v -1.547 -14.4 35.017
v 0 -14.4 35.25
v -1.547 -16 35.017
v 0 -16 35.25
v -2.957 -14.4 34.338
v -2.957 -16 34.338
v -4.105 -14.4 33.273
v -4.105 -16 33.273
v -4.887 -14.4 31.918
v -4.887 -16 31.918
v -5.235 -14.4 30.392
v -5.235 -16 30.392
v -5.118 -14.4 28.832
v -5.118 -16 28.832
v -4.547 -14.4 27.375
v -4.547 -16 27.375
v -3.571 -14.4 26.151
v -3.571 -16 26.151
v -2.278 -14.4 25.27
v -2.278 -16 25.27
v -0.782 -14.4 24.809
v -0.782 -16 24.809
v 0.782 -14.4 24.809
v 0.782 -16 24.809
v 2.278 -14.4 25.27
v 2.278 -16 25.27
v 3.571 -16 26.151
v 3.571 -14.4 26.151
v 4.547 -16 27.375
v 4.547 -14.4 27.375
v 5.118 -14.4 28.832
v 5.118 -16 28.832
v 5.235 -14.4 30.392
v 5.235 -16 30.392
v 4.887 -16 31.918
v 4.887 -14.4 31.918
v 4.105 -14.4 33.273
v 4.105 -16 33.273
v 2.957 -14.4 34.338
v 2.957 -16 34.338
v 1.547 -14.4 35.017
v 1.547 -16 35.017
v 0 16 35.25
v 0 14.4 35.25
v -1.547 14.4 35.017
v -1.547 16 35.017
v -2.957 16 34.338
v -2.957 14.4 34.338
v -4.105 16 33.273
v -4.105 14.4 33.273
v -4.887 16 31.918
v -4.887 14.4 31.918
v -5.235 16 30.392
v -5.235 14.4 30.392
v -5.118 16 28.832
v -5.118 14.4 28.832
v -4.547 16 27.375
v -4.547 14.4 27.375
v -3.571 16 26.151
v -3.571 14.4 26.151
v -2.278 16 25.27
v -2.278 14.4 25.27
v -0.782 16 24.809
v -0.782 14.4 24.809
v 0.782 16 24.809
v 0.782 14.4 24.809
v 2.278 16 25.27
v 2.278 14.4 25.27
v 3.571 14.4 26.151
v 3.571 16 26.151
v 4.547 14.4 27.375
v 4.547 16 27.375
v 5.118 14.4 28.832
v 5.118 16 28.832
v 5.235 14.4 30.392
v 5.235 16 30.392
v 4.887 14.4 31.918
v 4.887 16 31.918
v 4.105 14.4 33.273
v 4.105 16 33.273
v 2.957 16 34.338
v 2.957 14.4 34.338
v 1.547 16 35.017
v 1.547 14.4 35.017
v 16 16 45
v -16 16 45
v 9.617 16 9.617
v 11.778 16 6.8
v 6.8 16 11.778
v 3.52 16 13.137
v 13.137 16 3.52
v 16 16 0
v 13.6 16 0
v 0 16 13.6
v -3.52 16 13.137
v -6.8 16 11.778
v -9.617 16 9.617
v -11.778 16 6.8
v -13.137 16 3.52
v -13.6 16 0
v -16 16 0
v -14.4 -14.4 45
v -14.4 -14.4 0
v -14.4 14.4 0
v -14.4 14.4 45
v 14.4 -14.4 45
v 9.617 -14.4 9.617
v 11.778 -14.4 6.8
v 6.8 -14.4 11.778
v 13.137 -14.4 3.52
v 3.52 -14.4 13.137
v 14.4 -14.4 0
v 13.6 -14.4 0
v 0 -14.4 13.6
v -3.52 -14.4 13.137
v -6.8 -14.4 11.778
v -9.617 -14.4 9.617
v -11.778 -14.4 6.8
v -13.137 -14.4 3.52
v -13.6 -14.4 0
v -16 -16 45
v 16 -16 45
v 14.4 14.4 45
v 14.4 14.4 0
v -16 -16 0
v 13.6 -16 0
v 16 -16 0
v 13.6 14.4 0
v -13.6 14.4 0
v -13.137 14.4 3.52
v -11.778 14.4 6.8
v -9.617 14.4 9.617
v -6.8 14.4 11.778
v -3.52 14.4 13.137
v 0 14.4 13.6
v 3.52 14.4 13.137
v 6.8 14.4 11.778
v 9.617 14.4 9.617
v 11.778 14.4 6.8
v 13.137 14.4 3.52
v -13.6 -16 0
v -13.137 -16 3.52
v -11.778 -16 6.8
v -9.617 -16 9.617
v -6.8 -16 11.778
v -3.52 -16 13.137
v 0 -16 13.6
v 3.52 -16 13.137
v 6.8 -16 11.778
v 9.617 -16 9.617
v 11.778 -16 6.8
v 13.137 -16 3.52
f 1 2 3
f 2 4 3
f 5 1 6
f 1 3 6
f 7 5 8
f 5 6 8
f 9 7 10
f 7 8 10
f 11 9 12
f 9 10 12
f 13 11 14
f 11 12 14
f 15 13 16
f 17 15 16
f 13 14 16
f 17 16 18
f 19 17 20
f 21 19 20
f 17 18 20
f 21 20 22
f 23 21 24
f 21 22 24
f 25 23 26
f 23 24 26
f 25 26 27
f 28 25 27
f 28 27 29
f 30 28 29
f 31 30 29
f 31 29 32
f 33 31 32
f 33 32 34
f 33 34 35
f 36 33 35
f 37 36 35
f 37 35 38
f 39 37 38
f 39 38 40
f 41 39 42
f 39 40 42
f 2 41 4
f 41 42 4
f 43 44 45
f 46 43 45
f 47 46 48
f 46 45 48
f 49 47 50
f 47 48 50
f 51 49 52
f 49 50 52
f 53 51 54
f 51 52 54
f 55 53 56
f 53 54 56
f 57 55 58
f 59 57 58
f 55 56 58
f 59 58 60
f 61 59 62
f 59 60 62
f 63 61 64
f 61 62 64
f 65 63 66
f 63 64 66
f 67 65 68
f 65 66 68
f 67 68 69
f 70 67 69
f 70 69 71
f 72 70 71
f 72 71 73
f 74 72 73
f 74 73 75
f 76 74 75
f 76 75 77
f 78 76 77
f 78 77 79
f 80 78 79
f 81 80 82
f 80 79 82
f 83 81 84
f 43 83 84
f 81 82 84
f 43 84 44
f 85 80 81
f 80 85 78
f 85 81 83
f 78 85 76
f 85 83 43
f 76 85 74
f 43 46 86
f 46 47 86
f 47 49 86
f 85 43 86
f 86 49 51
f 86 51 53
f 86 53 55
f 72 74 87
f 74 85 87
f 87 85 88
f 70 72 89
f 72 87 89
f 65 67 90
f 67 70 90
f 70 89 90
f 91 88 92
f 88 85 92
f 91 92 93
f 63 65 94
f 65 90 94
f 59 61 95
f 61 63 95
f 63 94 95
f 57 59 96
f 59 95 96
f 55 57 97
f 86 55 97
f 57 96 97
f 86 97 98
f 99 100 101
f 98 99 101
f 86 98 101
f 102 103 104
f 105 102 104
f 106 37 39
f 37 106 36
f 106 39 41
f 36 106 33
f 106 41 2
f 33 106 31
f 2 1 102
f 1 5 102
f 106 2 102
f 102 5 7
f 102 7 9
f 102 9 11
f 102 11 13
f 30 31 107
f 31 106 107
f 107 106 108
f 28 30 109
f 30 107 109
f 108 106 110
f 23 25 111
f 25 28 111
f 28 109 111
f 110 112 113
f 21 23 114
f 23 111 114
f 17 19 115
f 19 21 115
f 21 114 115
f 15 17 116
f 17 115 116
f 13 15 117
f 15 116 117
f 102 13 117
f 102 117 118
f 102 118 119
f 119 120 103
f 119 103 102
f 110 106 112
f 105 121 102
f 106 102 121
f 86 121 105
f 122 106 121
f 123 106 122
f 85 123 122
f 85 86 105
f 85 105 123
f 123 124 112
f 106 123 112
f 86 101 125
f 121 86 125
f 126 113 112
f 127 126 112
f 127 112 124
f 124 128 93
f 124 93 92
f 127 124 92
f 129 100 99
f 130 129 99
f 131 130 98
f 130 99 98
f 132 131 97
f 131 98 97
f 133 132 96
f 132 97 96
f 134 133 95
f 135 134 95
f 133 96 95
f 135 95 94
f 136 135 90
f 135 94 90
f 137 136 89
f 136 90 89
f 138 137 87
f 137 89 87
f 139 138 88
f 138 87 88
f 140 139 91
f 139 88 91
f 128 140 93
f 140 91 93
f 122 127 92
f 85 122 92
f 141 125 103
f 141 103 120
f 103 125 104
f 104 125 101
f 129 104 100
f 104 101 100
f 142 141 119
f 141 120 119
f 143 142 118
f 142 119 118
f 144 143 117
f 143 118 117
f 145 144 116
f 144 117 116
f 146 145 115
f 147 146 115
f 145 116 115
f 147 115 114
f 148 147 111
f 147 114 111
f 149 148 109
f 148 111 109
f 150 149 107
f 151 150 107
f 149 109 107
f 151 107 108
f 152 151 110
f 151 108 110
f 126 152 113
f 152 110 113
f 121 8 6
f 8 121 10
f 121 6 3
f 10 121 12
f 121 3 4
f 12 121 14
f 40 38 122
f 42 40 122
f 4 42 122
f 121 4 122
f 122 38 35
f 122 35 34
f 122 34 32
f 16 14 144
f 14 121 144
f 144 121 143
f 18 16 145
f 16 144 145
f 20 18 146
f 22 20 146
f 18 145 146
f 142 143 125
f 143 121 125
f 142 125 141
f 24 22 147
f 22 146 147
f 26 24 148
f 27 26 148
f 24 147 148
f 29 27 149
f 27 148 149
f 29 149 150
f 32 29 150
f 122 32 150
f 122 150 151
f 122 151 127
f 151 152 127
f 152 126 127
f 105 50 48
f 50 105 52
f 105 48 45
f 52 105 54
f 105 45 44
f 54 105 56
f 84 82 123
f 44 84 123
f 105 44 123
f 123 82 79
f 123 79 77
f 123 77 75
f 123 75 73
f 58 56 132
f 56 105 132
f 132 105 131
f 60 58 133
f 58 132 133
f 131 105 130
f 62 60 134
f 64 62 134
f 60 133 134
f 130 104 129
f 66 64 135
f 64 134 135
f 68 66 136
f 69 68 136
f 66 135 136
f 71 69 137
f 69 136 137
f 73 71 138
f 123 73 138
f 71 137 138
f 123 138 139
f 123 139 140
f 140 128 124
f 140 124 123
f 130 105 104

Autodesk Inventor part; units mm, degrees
ref_plane "YZ Plane" through (0, 0, 0) normal (1, 0, 0) x (0, 1, 0)
ref_plane "XZ Plane" through (0, 0, 0) normal (0, 1, 0) x (-1, 0, 0)
ref_plane "XY Plane" through (0, 0, 0) normal (0, 0, 1) x (1, 0, 0)
sketch "スケッチ1" plane through (0, 0, 0) normal (0, 0, 1) x (1, 0, 0)
  line L0 (-16, -16) -> (16, -16)
  line L1 (16, -16) -> (16, 16)
  line L2 (16, 16) -> (-16, 16)
  line L3 (-16, 16) -> (-16, -16)
  line L4 (-16, -16) -> (16, 16) construction
  line L5 (16, -16) -> (-16, 16) construction
  line L6 (-14.4, 14.4) -> (14.4, 14.4)
  line L7 (14.4, 14.4) -> (14.4, -14.4)
  line L8 (14.4, -14.4) -> (-14.4, -14.4)
  line L9 (-14.4, -14.4) -> (-14.4, 14.4)
  point P0 (0, 0)
  dimension "d0" = 32
  dimension "d1" = 32
  dimension "d2" = 1.6
extrude "押し出し1" add sketch "スケッチ1" along normal blind 45
sketch "スケッチ2" plane through (-16, 16, 0) normal (0, 1, 0) x (1, 0, 0)
  circle A0 centre (16, 0) radius 13.6
  dimension "d5" = 27.2
extrude "押し出し2" cut sketch "スケッチ2" against normal blind 32
sketch "スケッチ3" plane through (-16, 16, 45) normal (0, 1, 0) x (1, 0, 0)
  line L0 (32, 0) -> (0, 0) projected
  point P0 (16, 45)
  point P1 (16, 15)
  dimension "d16" = 30
hole "穴1" at (0, 16, 30) direction (0, -1, 0) diameter 10.5 end through all
sketch "スケッチ4" plane through (-16, 16, 45) normal (0, 1, 0) x (1, 0, 0)
  circle A0 centre (16, 15) radius 13.6
  point P0 (16, 45)
  dimension "d17" = 30
  dimension "d18" = 27.2
properties part number "軸受上用"
